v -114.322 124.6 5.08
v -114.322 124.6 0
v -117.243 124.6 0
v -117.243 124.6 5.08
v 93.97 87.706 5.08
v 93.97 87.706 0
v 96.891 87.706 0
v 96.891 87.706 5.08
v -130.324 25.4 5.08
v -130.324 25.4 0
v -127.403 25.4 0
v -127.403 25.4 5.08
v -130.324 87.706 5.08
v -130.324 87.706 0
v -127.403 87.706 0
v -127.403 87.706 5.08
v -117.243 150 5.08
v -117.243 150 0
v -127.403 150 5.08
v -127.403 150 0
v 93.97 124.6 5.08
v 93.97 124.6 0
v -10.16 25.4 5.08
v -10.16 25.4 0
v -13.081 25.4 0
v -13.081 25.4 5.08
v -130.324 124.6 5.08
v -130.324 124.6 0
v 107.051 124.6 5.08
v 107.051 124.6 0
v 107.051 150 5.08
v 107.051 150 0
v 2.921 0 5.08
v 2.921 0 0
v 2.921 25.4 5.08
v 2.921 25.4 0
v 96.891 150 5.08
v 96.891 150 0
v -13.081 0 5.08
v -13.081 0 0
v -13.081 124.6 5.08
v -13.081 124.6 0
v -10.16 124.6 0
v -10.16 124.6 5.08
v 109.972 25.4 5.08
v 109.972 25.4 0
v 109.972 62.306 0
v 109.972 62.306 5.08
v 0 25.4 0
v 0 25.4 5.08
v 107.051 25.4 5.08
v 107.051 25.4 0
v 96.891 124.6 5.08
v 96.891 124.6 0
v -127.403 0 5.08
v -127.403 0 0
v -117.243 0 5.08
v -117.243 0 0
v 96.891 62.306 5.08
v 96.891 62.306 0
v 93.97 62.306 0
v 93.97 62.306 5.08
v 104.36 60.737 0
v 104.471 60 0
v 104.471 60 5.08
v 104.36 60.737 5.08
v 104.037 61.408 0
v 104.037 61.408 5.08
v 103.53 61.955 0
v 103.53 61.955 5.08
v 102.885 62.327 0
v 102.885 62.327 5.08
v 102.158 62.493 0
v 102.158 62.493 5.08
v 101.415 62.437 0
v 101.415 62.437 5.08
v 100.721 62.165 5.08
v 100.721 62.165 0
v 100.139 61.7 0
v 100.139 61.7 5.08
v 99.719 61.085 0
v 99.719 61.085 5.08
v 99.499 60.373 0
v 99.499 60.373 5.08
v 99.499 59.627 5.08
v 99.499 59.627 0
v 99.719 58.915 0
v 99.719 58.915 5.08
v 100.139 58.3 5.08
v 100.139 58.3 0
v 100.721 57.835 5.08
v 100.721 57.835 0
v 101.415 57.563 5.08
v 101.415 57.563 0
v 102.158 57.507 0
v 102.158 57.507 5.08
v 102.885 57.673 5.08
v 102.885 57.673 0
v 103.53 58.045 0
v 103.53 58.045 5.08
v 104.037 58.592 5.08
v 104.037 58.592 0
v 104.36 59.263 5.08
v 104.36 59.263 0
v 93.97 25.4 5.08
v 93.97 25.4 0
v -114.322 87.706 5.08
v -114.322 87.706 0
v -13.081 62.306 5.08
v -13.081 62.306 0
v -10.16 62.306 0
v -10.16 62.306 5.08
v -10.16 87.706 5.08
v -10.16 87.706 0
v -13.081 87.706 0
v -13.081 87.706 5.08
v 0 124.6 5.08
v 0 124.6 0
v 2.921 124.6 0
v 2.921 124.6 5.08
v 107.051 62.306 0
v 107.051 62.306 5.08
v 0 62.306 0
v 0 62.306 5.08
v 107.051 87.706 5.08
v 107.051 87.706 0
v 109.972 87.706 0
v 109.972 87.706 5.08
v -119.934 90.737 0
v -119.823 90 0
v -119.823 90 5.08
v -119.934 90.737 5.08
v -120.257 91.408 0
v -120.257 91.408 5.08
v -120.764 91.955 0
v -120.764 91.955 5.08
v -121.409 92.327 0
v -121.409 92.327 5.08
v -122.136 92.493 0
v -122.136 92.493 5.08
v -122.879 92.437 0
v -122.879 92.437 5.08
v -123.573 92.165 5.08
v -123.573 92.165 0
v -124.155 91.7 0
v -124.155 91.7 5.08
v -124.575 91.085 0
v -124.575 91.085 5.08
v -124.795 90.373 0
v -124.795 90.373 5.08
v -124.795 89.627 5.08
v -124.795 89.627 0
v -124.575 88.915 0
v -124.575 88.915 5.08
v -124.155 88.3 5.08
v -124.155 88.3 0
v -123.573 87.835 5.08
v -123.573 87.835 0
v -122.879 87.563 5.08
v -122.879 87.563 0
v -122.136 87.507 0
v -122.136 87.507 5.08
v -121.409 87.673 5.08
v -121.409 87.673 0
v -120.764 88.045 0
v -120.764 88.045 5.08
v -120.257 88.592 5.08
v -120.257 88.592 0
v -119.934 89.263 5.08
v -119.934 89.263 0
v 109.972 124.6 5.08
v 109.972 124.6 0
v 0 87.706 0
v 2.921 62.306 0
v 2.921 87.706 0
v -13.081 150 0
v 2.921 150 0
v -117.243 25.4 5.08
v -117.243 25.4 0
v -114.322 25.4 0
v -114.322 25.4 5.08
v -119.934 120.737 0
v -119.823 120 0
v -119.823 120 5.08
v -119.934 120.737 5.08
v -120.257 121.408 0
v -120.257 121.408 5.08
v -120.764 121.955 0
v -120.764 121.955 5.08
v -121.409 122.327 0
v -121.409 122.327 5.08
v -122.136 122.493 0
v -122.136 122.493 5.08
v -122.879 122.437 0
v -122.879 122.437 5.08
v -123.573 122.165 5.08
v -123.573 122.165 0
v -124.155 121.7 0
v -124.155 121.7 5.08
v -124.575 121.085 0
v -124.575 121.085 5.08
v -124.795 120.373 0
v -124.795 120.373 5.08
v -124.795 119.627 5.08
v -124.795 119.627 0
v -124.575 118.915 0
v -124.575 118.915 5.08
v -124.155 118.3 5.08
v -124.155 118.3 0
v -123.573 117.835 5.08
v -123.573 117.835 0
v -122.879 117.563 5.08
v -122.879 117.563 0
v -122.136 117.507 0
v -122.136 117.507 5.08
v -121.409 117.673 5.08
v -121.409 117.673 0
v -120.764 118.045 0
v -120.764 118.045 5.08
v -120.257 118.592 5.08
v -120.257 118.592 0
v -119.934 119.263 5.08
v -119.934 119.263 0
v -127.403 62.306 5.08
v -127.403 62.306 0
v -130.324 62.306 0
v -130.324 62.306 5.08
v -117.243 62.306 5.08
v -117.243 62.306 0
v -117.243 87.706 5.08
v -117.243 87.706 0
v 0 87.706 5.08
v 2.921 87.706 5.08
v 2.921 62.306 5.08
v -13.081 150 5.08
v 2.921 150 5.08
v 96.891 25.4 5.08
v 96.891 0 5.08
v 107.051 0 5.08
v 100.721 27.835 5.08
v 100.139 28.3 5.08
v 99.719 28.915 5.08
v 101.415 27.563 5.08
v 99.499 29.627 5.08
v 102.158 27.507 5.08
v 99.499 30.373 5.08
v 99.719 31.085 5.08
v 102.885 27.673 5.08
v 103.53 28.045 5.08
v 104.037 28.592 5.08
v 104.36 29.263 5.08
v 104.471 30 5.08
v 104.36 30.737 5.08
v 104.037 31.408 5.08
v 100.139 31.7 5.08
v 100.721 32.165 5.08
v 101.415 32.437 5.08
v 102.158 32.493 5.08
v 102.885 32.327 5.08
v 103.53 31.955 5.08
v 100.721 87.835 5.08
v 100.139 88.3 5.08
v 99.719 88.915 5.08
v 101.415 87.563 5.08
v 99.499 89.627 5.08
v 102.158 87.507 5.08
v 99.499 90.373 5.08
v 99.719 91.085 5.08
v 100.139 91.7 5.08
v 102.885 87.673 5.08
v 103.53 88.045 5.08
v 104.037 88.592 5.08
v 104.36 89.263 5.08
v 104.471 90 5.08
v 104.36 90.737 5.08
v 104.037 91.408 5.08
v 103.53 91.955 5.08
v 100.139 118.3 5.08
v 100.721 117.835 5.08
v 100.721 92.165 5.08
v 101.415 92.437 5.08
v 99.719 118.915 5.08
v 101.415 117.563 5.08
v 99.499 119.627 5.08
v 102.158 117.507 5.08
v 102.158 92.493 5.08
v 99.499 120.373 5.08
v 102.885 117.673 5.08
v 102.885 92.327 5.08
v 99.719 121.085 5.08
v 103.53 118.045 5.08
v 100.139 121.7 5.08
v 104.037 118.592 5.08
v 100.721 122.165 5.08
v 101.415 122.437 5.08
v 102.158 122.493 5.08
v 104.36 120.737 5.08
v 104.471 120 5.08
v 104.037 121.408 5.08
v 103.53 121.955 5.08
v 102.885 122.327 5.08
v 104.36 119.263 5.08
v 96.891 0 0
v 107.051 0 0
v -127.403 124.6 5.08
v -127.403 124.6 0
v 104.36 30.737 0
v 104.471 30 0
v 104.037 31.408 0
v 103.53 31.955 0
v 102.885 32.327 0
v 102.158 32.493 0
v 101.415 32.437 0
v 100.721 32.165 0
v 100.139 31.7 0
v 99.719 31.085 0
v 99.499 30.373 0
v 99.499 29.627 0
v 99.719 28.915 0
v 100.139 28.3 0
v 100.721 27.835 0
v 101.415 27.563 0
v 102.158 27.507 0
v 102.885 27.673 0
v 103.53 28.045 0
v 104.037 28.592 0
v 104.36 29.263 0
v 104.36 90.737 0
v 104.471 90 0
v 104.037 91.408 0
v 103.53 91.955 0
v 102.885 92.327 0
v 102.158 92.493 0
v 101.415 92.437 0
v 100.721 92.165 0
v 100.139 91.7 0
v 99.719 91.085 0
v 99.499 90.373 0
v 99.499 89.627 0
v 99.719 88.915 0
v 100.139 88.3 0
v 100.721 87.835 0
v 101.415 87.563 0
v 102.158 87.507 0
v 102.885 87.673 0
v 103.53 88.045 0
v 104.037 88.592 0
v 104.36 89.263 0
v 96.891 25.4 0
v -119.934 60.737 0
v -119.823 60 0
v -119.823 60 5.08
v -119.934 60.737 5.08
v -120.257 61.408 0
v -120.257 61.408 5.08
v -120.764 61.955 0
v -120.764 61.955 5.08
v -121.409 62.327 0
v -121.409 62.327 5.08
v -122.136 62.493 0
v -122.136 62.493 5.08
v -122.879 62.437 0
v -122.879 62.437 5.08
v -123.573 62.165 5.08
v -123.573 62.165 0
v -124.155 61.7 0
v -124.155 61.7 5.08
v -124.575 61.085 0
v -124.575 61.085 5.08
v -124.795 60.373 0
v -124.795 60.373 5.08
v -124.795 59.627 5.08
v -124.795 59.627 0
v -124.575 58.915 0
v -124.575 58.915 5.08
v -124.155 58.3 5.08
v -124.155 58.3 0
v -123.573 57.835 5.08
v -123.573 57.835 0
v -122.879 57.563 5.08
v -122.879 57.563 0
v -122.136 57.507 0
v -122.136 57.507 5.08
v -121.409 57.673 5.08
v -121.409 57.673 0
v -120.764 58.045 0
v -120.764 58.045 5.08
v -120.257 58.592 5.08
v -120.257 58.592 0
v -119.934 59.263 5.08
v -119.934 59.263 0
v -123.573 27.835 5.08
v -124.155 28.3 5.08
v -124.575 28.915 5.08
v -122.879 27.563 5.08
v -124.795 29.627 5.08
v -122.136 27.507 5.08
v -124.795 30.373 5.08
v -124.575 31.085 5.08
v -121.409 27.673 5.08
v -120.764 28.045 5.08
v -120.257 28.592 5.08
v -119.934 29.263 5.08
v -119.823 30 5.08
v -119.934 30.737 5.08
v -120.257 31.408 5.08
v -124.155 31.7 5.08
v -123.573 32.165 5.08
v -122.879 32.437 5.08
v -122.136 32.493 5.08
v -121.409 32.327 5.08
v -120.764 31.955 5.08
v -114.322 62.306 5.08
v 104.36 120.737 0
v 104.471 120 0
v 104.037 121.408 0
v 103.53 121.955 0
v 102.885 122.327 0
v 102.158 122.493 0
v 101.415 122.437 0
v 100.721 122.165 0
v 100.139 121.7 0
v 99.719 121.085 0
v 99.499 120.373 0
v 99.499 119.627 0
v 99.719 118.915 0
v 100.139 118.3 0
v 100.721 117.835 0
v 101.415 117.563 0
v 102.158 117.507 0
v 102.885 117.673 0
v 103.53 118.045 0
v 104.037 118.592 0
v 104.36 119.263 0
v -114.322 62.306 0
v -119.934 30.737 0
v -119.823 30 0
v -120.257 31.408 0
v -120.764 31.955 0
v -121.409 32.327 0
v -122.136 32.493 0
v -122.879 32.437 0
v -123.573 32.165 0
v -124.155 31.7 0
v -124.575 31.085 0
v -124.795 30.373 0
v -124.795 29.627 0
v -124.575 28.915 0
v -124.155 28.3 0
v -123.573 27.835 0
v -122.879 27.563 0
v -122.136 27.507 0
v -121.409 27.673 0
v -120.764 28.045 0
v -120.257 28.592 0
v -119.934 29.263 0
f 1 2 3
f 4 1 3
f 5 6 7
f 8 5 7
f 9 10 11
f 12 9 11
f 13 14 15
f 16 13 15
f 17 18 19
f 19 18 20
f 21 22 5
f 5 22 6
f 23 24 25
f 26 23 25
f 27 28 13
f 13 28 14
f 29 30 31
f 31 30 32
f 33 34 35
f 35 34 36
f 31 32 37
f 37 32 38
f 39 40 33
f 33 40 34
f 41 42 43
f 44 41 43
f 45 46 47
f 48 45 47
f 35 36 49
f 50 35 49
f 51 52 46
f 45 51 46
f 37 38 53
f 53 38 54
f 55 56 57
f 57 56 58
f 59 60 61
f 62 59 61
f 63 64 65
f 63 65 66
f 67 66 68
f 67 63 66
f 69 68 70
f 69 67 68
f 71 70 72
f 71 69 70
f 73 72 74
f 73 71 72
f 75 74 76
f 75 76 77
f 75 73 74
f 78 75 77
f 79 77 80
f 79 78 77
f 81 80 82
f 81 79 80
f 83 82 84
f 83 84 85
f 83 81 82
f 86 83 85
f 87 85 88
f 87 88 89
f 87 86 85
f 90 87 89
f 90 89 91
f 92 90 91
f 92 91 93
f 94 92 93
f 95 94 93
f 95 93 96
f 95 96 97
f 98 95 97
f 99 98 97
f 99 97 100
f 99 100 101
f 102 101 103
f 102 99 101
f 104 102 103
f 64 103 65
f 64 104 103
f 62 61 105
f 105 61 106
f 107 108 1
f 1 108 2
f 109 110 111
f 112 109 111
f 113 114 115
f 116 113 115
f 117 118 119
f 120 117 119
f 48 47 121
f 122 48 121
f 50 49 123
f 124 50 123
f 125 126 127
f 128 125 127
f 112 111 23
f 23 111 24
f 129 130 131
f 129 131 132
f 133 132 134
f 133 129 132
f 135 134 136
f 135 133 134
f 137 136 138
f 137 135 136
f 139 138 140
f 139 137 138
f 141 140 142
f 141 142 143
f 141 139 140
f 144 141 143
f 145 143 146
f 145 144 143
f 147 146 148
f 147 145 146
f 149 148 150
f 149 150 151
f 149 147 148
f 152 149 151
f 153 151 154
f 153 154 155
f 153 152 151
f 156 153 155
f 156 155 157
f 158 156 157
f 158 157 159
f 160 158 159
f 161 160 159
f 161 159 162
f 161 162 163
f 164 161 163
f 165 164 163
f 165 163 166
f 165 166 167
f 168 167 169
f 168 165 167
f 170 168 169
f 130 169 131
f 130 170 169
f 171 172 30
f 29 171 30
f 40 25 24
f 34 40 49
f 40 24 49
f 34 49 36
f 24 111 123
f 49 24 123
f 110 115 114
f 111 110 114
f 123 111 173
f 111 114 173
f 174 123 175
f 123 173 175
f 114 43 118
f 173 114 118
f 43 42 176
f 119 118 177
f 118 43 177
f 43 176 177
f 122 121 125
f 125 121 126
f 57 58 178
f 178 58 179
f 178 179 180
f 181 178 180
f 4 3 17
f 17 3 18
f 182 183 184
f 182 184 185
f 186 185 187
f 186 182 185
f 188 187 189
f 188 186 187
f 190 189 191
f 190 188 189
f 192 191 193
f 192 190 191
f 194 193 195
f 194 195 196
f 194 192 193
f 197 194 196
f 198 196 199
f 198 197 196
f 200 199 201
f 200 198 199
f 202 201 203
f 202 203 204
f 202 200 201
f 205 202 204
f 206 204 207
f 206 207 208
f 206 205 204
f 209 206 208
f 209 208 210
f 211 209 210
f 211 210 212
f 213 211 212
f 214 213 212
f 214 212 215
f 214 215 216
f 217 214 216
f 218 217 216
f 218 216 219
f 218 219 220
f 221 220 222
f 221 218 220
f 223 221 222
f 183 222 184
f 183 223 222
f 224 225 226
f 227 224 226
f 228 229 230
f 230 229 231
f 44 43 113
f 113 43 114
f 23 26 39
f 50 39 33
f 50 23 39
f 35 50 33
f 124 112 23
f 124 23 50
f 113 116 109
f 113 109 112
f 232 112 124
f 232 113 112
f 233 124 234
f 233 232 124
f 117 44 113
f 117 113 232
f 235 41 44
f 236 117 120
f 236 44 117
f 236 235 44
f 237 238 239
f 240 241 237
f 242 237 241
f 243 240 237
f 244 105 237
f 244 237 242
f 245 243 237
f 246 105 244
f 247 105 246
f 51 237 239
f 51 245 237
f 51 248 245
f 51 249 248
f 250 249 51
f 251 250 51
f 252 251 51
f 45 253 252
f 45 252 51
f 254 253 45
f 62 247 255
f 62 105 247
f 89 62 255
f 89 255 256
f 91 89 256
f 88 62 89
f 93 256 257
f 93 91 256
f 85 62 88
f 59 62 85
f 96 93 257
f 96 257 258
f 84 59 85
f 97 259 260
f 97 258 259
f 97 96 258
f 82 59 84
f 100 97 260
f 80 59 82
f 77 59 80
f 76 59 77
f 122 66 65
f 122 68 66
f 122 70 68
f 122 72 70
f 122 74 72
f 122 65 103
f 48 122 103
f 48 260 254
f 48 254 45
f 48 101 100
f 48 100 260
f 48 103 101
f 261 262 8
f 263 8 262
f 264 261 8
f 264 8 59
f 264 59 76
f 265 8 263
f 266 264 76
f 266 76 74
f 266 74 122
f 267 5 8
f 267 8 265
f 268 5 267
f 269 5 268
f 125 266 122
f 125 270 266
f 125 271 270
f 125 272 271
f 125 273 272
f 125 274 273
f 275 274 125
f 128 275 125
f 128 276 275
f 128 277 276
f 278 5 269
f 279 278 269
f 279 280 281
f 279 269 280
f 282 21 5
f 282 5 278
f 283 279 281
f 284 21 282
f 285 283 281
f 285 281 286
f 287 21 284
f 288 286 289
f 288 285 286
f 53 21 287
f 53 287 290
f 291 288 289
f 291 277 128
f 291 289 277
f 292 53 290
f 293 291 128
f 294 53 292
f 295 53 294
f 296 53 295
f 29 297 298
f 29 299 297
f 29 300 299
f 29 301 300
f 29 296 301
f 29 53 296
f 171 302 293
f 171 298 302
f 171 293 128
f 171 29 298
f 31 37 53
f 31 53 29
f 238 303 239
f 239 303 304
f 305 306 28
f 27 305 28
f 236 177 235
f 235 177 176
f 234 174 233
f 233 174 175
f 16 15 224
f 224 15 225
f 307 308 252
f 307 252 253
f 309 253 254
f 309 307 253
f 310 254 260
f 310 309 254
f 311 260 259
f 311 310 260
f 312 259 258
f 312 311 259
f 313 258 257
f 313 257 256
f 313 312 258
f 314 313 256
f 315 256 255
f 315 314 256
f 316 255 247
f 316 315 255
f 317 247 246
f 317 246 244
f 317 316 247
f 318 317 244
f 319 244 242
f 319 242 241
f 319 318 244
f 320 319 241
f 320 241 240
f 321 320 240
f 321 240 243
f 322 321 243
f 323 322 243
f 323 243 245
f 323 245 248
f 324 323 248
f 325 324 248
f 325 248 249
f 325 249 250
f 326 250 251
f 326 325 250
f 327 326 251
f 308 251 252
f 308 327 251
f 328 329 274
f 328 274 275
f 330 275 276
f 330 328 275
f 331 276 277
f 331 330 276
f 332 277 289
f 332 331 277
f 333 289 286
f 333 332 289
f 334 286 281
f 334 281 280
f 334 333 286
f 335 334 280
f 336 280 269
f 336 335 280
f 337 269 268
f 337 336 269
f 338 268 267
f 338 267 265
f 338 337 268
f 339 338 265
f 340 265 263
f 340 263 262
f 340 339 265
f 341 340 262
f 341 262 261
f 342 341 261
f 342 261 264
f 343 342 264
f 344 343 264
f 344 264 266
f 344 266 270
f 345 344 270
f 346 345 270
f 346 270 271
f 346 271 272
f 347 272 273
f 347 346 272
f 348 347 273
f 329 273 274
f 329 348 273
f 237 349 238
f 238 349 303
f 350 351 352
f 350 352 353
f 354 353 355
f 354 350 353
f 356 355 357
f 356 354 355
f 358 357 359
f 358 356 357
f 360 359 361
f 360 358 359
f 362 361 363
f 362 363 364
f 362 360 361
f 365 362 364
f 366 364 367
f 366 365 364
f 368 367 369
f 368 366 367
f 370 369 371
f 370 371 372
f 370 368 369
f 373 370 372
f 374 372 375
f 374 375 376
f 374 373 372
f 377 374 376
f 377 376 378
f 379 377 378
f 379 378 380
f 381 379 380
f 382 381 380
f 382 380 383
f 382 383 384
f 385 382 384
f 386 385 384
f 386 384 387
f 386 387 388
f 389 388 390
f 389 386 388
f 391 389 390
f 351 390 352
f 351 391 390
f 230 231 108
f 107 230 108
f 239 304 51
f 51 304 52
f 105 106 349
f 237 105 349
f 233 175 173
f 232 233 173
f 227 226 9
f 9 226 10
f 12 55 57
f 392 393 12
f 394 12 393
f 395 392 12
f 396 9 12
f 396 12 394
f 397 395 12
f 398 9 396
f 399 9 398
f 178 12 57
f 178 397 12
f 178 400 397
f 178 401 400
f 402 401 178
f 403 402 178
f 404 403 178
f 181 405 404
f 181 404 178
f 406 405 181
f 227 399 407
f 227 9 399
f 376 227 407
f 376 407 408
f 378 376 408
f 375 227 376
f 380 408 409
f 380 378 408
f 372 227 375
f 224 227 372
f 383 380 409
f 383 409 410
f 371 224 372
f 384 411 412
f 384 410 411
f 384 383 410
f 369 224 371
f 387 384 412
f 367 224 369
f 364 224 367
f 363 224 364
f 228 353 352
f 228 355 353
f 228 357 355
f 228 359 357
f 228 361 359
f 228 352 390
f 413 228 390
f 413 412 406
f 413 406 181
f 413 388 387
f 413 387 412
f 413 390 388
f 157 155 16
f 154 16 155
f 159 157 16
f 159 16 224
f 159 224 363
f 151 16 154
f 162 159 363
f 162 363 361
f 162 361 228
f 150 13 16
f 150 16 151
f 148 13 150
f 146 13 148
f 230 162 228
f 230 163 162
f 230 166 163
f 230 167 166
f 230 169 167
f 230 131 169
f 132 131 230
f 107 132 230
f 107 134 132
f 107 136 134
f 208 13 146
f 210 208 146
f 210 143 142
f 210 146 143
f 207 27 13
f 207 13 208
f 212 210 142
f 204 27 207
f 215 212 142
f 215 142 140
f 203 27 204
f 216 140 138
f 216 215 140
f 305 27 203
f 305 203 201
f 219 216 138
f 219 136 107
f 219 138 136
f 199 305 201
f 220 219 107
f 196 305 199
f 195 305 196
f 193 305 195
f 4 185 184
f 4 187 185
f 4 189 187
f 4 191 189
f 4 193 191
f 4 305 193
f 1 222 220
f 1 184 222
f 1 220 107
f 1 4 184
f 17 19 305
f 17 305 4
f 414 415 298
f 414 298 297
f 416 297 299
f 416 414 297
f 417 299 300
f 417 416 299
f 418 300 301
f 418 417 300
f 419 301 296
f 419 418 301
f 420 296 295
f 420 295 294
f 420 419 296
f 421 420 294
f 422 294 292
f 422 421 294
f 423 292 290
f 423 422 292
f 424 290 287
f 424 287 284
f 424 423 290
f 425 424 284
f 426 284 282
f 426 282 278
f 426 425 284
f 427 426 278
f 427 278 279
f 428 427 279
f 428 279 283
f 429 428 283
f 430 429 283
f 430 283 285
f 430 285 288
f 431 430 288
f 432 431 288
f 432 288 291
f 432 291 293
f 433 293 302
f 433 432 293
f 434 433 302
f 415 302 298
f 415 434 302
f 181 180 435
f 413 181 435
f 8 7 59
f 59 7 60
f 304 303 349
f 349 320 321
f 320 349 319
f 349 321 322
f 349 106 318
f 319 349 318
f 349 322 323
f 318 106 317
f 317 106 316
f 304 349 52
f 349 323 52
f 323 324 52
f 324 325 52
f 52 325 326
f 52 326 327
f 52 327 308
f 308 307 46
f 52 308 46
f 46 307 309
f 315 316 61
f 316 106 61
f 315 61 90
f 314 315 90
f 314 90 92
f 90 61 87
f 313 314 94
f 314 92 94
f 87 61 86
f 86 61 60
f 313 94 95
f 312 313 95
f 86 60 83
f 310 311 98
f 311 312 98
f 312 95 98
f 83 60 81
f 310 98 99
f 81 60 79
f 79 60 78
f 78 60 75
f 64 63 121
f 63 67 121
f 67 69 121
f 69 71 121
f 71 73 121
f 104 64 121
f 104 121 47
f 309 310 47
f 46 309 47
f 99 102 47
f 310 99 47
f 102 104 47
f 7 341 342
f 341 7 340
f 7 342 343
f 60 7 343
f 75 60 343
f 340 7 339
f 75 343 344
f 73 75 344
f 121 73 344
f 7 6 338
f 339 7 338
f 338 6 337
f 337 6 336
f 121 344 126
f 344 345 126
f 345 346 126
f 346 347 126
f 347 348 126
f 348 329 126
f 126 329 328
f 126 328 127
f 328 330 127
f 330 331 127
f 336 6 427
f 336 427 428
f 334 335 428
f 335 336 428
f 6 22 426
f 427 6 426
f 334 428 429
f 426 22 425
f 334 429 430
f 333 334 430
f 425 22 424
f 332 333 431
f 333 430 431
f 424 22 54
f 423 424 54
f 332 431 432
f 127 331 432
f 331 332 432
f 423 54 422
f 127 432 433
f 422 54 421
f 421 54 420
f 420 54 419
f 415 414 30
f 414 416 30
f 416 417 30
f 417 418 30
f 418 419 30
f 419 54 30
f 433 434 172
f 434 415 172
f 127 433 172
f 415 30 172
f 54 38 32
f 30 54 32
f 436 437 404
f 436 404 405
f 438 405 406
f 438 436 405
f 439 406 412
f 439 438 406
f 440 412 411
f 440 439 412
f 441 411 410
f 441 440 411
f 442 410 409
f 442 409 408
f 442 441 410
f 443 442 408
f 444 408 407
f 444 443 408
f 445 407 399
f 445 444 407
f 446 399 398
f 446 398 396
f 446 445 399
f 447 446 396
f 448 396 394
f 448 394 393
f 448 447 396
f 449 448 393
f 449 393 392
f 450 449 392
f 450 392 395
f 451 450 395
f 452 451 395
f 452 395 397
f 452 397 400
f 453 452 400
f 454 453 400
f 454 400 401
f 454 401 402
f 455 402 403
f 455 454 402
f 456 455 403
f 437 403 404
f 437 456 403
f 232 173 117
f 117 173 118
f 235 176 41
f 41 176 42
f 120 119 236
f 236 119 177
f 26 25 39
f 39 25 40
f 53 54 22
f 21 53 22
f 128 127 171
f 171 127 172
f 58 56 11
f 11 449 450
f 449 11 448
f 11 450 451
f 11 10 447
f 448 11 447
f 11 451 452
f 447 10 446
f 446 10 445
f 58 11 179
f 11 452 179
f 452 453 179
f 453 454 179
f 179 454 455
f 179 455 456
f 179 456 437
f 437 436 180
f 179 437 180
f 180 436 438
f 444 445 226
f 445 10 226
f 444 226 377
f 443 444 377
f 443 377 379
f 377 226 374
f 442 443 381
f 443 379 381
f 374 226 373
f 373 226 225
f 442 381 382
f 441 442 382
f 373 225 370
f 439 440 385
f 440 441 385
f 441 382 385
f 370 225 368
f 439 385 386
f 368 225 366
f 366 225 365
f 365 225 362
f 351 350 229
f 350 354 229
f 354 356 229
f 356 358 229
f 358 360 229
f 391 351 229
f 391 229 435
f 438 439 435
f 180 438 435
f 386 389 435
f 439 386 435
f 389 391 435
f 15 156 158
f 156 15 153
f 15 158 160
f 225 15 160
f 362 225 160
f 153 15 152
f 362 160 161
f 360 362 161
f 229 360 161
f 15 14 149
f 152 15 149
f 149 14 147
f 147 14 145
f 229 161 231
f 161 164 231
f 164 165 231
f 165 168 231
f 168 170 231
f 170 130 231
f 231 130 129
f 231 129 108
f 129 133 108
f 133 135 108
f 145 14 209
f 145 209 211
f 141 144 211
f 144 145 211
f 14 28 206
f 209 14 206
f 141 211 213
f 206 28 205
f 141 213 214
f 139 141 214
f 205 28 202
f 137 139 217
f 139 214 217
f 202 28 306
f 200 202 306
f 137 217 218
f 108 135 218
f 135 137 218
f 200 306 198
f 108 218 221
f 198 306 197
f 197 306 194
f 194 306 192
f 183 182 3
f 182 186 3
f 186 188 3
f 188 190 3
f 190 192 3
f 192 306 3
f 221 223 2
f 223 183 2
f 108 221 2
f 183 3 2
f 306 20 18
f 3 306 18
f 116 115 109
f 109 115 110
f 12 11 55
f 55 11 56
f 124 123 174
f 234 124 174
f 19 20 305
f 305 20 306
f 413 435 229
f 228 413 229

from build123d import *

# Parameters (mm, degrees)
F0_R     = 2.5
F1_DEPTH = 5.08


with BuildPart() as f1:
    # F0 (on Top) → F1 (new body)
    with BuildSketch(Plane.XY):
        Polygon((-127.402619, 25.4), (-127.402619, 0), (-117.242619, 0), (-117.242619, 25.4), (-114.321619, 25.4), (-114.321619, 62.3062), (-117.242619, 62.3062), (-117.242619, 87.7062), (-114.321619, 87.7062), (-114.321619, 124.6), (-117.242619, 124.6), (-117.242619, 150), (-127.402619, 150), (-127.402619, 124.6), (-130.323619, 124.6), (-130.323619, 87.7062), (-127.402619, 87.7062), (-127.402619, 62.3062), (-130.323619, 62.3062), (-130.323619, 25.4), align=None)
        with Locations((-122.322619, 30)):
            Circle(F0_R, mode=Mode.SUBTRACT)
        with Locations((-122.322619, 60)):
            Circle(F0_R, mode=Mode.SUBTRACT)
        with Locations((-122.322619, 90)):
            Circle(F0_R, mode=Mode.SUBTRACT)
        with Locations((-122.322619, 120)):
            Circle(F0_R, mode=Mode.SUBTRACT)
        Polygon((0, 87.7062), (0, 124.6), (2.921, 124.6), (2.921, 150), (0, 150), (-10.16, 150), (-13.081, 150), (-13.081, 124.6), (-10.16, 124.6), (-10.16, 87.7062), (-13.081, 87.7062), (-13.081, 62.3062), (-10.16, 62.3062), (-10.16, 25.4), (-13.081, 25.4), (-13.081, 0), (-10.16, 0), (0, 0), (2.921, 0), (2.921, 25.4), (0, 25.4), (0, 62.3062), (2.921, 62.3062), (2.921, 87.7062), align=None)
        Polygon((96.891231, 25.4), (96.891231, 0), (107.051231, 0), (107.051231, 25.4), (109.972231, 25.4), (109.972231, 62.3062), (107.051231, 62.3062), (107.051231, 87.7062), (109.972231, 87.7062), (109.972231, 124.6), (107.051231, 124.6), (107.051231, 150), (96.891231, 150), (96.891231, 124.6), (93.970231, 124.6), (93.970231, 87.7062), (96.891231, 87.7062), (96.891231, 62.3062), (93.970231, 62.3062), (93.970231, 25.4), align=None)
        with Locations((101.971231, 30)):
            Circle(F0_R, mode=Mode.SUBTRACT)
        with Locations((101.971231, 60)):
            Circle(F0_R, mode=Mode.SUBTRACT)
        with Locations((101.971231, 90)):
            Circle(F0_R, mode=Mode.SUBTRACT)
        with Locations((101.971231, 120)):
            Circle(F0_R, mode=Mode.SUBTRACT)
    extrude(amount=F1_DEPTH)


solid = f1.part
